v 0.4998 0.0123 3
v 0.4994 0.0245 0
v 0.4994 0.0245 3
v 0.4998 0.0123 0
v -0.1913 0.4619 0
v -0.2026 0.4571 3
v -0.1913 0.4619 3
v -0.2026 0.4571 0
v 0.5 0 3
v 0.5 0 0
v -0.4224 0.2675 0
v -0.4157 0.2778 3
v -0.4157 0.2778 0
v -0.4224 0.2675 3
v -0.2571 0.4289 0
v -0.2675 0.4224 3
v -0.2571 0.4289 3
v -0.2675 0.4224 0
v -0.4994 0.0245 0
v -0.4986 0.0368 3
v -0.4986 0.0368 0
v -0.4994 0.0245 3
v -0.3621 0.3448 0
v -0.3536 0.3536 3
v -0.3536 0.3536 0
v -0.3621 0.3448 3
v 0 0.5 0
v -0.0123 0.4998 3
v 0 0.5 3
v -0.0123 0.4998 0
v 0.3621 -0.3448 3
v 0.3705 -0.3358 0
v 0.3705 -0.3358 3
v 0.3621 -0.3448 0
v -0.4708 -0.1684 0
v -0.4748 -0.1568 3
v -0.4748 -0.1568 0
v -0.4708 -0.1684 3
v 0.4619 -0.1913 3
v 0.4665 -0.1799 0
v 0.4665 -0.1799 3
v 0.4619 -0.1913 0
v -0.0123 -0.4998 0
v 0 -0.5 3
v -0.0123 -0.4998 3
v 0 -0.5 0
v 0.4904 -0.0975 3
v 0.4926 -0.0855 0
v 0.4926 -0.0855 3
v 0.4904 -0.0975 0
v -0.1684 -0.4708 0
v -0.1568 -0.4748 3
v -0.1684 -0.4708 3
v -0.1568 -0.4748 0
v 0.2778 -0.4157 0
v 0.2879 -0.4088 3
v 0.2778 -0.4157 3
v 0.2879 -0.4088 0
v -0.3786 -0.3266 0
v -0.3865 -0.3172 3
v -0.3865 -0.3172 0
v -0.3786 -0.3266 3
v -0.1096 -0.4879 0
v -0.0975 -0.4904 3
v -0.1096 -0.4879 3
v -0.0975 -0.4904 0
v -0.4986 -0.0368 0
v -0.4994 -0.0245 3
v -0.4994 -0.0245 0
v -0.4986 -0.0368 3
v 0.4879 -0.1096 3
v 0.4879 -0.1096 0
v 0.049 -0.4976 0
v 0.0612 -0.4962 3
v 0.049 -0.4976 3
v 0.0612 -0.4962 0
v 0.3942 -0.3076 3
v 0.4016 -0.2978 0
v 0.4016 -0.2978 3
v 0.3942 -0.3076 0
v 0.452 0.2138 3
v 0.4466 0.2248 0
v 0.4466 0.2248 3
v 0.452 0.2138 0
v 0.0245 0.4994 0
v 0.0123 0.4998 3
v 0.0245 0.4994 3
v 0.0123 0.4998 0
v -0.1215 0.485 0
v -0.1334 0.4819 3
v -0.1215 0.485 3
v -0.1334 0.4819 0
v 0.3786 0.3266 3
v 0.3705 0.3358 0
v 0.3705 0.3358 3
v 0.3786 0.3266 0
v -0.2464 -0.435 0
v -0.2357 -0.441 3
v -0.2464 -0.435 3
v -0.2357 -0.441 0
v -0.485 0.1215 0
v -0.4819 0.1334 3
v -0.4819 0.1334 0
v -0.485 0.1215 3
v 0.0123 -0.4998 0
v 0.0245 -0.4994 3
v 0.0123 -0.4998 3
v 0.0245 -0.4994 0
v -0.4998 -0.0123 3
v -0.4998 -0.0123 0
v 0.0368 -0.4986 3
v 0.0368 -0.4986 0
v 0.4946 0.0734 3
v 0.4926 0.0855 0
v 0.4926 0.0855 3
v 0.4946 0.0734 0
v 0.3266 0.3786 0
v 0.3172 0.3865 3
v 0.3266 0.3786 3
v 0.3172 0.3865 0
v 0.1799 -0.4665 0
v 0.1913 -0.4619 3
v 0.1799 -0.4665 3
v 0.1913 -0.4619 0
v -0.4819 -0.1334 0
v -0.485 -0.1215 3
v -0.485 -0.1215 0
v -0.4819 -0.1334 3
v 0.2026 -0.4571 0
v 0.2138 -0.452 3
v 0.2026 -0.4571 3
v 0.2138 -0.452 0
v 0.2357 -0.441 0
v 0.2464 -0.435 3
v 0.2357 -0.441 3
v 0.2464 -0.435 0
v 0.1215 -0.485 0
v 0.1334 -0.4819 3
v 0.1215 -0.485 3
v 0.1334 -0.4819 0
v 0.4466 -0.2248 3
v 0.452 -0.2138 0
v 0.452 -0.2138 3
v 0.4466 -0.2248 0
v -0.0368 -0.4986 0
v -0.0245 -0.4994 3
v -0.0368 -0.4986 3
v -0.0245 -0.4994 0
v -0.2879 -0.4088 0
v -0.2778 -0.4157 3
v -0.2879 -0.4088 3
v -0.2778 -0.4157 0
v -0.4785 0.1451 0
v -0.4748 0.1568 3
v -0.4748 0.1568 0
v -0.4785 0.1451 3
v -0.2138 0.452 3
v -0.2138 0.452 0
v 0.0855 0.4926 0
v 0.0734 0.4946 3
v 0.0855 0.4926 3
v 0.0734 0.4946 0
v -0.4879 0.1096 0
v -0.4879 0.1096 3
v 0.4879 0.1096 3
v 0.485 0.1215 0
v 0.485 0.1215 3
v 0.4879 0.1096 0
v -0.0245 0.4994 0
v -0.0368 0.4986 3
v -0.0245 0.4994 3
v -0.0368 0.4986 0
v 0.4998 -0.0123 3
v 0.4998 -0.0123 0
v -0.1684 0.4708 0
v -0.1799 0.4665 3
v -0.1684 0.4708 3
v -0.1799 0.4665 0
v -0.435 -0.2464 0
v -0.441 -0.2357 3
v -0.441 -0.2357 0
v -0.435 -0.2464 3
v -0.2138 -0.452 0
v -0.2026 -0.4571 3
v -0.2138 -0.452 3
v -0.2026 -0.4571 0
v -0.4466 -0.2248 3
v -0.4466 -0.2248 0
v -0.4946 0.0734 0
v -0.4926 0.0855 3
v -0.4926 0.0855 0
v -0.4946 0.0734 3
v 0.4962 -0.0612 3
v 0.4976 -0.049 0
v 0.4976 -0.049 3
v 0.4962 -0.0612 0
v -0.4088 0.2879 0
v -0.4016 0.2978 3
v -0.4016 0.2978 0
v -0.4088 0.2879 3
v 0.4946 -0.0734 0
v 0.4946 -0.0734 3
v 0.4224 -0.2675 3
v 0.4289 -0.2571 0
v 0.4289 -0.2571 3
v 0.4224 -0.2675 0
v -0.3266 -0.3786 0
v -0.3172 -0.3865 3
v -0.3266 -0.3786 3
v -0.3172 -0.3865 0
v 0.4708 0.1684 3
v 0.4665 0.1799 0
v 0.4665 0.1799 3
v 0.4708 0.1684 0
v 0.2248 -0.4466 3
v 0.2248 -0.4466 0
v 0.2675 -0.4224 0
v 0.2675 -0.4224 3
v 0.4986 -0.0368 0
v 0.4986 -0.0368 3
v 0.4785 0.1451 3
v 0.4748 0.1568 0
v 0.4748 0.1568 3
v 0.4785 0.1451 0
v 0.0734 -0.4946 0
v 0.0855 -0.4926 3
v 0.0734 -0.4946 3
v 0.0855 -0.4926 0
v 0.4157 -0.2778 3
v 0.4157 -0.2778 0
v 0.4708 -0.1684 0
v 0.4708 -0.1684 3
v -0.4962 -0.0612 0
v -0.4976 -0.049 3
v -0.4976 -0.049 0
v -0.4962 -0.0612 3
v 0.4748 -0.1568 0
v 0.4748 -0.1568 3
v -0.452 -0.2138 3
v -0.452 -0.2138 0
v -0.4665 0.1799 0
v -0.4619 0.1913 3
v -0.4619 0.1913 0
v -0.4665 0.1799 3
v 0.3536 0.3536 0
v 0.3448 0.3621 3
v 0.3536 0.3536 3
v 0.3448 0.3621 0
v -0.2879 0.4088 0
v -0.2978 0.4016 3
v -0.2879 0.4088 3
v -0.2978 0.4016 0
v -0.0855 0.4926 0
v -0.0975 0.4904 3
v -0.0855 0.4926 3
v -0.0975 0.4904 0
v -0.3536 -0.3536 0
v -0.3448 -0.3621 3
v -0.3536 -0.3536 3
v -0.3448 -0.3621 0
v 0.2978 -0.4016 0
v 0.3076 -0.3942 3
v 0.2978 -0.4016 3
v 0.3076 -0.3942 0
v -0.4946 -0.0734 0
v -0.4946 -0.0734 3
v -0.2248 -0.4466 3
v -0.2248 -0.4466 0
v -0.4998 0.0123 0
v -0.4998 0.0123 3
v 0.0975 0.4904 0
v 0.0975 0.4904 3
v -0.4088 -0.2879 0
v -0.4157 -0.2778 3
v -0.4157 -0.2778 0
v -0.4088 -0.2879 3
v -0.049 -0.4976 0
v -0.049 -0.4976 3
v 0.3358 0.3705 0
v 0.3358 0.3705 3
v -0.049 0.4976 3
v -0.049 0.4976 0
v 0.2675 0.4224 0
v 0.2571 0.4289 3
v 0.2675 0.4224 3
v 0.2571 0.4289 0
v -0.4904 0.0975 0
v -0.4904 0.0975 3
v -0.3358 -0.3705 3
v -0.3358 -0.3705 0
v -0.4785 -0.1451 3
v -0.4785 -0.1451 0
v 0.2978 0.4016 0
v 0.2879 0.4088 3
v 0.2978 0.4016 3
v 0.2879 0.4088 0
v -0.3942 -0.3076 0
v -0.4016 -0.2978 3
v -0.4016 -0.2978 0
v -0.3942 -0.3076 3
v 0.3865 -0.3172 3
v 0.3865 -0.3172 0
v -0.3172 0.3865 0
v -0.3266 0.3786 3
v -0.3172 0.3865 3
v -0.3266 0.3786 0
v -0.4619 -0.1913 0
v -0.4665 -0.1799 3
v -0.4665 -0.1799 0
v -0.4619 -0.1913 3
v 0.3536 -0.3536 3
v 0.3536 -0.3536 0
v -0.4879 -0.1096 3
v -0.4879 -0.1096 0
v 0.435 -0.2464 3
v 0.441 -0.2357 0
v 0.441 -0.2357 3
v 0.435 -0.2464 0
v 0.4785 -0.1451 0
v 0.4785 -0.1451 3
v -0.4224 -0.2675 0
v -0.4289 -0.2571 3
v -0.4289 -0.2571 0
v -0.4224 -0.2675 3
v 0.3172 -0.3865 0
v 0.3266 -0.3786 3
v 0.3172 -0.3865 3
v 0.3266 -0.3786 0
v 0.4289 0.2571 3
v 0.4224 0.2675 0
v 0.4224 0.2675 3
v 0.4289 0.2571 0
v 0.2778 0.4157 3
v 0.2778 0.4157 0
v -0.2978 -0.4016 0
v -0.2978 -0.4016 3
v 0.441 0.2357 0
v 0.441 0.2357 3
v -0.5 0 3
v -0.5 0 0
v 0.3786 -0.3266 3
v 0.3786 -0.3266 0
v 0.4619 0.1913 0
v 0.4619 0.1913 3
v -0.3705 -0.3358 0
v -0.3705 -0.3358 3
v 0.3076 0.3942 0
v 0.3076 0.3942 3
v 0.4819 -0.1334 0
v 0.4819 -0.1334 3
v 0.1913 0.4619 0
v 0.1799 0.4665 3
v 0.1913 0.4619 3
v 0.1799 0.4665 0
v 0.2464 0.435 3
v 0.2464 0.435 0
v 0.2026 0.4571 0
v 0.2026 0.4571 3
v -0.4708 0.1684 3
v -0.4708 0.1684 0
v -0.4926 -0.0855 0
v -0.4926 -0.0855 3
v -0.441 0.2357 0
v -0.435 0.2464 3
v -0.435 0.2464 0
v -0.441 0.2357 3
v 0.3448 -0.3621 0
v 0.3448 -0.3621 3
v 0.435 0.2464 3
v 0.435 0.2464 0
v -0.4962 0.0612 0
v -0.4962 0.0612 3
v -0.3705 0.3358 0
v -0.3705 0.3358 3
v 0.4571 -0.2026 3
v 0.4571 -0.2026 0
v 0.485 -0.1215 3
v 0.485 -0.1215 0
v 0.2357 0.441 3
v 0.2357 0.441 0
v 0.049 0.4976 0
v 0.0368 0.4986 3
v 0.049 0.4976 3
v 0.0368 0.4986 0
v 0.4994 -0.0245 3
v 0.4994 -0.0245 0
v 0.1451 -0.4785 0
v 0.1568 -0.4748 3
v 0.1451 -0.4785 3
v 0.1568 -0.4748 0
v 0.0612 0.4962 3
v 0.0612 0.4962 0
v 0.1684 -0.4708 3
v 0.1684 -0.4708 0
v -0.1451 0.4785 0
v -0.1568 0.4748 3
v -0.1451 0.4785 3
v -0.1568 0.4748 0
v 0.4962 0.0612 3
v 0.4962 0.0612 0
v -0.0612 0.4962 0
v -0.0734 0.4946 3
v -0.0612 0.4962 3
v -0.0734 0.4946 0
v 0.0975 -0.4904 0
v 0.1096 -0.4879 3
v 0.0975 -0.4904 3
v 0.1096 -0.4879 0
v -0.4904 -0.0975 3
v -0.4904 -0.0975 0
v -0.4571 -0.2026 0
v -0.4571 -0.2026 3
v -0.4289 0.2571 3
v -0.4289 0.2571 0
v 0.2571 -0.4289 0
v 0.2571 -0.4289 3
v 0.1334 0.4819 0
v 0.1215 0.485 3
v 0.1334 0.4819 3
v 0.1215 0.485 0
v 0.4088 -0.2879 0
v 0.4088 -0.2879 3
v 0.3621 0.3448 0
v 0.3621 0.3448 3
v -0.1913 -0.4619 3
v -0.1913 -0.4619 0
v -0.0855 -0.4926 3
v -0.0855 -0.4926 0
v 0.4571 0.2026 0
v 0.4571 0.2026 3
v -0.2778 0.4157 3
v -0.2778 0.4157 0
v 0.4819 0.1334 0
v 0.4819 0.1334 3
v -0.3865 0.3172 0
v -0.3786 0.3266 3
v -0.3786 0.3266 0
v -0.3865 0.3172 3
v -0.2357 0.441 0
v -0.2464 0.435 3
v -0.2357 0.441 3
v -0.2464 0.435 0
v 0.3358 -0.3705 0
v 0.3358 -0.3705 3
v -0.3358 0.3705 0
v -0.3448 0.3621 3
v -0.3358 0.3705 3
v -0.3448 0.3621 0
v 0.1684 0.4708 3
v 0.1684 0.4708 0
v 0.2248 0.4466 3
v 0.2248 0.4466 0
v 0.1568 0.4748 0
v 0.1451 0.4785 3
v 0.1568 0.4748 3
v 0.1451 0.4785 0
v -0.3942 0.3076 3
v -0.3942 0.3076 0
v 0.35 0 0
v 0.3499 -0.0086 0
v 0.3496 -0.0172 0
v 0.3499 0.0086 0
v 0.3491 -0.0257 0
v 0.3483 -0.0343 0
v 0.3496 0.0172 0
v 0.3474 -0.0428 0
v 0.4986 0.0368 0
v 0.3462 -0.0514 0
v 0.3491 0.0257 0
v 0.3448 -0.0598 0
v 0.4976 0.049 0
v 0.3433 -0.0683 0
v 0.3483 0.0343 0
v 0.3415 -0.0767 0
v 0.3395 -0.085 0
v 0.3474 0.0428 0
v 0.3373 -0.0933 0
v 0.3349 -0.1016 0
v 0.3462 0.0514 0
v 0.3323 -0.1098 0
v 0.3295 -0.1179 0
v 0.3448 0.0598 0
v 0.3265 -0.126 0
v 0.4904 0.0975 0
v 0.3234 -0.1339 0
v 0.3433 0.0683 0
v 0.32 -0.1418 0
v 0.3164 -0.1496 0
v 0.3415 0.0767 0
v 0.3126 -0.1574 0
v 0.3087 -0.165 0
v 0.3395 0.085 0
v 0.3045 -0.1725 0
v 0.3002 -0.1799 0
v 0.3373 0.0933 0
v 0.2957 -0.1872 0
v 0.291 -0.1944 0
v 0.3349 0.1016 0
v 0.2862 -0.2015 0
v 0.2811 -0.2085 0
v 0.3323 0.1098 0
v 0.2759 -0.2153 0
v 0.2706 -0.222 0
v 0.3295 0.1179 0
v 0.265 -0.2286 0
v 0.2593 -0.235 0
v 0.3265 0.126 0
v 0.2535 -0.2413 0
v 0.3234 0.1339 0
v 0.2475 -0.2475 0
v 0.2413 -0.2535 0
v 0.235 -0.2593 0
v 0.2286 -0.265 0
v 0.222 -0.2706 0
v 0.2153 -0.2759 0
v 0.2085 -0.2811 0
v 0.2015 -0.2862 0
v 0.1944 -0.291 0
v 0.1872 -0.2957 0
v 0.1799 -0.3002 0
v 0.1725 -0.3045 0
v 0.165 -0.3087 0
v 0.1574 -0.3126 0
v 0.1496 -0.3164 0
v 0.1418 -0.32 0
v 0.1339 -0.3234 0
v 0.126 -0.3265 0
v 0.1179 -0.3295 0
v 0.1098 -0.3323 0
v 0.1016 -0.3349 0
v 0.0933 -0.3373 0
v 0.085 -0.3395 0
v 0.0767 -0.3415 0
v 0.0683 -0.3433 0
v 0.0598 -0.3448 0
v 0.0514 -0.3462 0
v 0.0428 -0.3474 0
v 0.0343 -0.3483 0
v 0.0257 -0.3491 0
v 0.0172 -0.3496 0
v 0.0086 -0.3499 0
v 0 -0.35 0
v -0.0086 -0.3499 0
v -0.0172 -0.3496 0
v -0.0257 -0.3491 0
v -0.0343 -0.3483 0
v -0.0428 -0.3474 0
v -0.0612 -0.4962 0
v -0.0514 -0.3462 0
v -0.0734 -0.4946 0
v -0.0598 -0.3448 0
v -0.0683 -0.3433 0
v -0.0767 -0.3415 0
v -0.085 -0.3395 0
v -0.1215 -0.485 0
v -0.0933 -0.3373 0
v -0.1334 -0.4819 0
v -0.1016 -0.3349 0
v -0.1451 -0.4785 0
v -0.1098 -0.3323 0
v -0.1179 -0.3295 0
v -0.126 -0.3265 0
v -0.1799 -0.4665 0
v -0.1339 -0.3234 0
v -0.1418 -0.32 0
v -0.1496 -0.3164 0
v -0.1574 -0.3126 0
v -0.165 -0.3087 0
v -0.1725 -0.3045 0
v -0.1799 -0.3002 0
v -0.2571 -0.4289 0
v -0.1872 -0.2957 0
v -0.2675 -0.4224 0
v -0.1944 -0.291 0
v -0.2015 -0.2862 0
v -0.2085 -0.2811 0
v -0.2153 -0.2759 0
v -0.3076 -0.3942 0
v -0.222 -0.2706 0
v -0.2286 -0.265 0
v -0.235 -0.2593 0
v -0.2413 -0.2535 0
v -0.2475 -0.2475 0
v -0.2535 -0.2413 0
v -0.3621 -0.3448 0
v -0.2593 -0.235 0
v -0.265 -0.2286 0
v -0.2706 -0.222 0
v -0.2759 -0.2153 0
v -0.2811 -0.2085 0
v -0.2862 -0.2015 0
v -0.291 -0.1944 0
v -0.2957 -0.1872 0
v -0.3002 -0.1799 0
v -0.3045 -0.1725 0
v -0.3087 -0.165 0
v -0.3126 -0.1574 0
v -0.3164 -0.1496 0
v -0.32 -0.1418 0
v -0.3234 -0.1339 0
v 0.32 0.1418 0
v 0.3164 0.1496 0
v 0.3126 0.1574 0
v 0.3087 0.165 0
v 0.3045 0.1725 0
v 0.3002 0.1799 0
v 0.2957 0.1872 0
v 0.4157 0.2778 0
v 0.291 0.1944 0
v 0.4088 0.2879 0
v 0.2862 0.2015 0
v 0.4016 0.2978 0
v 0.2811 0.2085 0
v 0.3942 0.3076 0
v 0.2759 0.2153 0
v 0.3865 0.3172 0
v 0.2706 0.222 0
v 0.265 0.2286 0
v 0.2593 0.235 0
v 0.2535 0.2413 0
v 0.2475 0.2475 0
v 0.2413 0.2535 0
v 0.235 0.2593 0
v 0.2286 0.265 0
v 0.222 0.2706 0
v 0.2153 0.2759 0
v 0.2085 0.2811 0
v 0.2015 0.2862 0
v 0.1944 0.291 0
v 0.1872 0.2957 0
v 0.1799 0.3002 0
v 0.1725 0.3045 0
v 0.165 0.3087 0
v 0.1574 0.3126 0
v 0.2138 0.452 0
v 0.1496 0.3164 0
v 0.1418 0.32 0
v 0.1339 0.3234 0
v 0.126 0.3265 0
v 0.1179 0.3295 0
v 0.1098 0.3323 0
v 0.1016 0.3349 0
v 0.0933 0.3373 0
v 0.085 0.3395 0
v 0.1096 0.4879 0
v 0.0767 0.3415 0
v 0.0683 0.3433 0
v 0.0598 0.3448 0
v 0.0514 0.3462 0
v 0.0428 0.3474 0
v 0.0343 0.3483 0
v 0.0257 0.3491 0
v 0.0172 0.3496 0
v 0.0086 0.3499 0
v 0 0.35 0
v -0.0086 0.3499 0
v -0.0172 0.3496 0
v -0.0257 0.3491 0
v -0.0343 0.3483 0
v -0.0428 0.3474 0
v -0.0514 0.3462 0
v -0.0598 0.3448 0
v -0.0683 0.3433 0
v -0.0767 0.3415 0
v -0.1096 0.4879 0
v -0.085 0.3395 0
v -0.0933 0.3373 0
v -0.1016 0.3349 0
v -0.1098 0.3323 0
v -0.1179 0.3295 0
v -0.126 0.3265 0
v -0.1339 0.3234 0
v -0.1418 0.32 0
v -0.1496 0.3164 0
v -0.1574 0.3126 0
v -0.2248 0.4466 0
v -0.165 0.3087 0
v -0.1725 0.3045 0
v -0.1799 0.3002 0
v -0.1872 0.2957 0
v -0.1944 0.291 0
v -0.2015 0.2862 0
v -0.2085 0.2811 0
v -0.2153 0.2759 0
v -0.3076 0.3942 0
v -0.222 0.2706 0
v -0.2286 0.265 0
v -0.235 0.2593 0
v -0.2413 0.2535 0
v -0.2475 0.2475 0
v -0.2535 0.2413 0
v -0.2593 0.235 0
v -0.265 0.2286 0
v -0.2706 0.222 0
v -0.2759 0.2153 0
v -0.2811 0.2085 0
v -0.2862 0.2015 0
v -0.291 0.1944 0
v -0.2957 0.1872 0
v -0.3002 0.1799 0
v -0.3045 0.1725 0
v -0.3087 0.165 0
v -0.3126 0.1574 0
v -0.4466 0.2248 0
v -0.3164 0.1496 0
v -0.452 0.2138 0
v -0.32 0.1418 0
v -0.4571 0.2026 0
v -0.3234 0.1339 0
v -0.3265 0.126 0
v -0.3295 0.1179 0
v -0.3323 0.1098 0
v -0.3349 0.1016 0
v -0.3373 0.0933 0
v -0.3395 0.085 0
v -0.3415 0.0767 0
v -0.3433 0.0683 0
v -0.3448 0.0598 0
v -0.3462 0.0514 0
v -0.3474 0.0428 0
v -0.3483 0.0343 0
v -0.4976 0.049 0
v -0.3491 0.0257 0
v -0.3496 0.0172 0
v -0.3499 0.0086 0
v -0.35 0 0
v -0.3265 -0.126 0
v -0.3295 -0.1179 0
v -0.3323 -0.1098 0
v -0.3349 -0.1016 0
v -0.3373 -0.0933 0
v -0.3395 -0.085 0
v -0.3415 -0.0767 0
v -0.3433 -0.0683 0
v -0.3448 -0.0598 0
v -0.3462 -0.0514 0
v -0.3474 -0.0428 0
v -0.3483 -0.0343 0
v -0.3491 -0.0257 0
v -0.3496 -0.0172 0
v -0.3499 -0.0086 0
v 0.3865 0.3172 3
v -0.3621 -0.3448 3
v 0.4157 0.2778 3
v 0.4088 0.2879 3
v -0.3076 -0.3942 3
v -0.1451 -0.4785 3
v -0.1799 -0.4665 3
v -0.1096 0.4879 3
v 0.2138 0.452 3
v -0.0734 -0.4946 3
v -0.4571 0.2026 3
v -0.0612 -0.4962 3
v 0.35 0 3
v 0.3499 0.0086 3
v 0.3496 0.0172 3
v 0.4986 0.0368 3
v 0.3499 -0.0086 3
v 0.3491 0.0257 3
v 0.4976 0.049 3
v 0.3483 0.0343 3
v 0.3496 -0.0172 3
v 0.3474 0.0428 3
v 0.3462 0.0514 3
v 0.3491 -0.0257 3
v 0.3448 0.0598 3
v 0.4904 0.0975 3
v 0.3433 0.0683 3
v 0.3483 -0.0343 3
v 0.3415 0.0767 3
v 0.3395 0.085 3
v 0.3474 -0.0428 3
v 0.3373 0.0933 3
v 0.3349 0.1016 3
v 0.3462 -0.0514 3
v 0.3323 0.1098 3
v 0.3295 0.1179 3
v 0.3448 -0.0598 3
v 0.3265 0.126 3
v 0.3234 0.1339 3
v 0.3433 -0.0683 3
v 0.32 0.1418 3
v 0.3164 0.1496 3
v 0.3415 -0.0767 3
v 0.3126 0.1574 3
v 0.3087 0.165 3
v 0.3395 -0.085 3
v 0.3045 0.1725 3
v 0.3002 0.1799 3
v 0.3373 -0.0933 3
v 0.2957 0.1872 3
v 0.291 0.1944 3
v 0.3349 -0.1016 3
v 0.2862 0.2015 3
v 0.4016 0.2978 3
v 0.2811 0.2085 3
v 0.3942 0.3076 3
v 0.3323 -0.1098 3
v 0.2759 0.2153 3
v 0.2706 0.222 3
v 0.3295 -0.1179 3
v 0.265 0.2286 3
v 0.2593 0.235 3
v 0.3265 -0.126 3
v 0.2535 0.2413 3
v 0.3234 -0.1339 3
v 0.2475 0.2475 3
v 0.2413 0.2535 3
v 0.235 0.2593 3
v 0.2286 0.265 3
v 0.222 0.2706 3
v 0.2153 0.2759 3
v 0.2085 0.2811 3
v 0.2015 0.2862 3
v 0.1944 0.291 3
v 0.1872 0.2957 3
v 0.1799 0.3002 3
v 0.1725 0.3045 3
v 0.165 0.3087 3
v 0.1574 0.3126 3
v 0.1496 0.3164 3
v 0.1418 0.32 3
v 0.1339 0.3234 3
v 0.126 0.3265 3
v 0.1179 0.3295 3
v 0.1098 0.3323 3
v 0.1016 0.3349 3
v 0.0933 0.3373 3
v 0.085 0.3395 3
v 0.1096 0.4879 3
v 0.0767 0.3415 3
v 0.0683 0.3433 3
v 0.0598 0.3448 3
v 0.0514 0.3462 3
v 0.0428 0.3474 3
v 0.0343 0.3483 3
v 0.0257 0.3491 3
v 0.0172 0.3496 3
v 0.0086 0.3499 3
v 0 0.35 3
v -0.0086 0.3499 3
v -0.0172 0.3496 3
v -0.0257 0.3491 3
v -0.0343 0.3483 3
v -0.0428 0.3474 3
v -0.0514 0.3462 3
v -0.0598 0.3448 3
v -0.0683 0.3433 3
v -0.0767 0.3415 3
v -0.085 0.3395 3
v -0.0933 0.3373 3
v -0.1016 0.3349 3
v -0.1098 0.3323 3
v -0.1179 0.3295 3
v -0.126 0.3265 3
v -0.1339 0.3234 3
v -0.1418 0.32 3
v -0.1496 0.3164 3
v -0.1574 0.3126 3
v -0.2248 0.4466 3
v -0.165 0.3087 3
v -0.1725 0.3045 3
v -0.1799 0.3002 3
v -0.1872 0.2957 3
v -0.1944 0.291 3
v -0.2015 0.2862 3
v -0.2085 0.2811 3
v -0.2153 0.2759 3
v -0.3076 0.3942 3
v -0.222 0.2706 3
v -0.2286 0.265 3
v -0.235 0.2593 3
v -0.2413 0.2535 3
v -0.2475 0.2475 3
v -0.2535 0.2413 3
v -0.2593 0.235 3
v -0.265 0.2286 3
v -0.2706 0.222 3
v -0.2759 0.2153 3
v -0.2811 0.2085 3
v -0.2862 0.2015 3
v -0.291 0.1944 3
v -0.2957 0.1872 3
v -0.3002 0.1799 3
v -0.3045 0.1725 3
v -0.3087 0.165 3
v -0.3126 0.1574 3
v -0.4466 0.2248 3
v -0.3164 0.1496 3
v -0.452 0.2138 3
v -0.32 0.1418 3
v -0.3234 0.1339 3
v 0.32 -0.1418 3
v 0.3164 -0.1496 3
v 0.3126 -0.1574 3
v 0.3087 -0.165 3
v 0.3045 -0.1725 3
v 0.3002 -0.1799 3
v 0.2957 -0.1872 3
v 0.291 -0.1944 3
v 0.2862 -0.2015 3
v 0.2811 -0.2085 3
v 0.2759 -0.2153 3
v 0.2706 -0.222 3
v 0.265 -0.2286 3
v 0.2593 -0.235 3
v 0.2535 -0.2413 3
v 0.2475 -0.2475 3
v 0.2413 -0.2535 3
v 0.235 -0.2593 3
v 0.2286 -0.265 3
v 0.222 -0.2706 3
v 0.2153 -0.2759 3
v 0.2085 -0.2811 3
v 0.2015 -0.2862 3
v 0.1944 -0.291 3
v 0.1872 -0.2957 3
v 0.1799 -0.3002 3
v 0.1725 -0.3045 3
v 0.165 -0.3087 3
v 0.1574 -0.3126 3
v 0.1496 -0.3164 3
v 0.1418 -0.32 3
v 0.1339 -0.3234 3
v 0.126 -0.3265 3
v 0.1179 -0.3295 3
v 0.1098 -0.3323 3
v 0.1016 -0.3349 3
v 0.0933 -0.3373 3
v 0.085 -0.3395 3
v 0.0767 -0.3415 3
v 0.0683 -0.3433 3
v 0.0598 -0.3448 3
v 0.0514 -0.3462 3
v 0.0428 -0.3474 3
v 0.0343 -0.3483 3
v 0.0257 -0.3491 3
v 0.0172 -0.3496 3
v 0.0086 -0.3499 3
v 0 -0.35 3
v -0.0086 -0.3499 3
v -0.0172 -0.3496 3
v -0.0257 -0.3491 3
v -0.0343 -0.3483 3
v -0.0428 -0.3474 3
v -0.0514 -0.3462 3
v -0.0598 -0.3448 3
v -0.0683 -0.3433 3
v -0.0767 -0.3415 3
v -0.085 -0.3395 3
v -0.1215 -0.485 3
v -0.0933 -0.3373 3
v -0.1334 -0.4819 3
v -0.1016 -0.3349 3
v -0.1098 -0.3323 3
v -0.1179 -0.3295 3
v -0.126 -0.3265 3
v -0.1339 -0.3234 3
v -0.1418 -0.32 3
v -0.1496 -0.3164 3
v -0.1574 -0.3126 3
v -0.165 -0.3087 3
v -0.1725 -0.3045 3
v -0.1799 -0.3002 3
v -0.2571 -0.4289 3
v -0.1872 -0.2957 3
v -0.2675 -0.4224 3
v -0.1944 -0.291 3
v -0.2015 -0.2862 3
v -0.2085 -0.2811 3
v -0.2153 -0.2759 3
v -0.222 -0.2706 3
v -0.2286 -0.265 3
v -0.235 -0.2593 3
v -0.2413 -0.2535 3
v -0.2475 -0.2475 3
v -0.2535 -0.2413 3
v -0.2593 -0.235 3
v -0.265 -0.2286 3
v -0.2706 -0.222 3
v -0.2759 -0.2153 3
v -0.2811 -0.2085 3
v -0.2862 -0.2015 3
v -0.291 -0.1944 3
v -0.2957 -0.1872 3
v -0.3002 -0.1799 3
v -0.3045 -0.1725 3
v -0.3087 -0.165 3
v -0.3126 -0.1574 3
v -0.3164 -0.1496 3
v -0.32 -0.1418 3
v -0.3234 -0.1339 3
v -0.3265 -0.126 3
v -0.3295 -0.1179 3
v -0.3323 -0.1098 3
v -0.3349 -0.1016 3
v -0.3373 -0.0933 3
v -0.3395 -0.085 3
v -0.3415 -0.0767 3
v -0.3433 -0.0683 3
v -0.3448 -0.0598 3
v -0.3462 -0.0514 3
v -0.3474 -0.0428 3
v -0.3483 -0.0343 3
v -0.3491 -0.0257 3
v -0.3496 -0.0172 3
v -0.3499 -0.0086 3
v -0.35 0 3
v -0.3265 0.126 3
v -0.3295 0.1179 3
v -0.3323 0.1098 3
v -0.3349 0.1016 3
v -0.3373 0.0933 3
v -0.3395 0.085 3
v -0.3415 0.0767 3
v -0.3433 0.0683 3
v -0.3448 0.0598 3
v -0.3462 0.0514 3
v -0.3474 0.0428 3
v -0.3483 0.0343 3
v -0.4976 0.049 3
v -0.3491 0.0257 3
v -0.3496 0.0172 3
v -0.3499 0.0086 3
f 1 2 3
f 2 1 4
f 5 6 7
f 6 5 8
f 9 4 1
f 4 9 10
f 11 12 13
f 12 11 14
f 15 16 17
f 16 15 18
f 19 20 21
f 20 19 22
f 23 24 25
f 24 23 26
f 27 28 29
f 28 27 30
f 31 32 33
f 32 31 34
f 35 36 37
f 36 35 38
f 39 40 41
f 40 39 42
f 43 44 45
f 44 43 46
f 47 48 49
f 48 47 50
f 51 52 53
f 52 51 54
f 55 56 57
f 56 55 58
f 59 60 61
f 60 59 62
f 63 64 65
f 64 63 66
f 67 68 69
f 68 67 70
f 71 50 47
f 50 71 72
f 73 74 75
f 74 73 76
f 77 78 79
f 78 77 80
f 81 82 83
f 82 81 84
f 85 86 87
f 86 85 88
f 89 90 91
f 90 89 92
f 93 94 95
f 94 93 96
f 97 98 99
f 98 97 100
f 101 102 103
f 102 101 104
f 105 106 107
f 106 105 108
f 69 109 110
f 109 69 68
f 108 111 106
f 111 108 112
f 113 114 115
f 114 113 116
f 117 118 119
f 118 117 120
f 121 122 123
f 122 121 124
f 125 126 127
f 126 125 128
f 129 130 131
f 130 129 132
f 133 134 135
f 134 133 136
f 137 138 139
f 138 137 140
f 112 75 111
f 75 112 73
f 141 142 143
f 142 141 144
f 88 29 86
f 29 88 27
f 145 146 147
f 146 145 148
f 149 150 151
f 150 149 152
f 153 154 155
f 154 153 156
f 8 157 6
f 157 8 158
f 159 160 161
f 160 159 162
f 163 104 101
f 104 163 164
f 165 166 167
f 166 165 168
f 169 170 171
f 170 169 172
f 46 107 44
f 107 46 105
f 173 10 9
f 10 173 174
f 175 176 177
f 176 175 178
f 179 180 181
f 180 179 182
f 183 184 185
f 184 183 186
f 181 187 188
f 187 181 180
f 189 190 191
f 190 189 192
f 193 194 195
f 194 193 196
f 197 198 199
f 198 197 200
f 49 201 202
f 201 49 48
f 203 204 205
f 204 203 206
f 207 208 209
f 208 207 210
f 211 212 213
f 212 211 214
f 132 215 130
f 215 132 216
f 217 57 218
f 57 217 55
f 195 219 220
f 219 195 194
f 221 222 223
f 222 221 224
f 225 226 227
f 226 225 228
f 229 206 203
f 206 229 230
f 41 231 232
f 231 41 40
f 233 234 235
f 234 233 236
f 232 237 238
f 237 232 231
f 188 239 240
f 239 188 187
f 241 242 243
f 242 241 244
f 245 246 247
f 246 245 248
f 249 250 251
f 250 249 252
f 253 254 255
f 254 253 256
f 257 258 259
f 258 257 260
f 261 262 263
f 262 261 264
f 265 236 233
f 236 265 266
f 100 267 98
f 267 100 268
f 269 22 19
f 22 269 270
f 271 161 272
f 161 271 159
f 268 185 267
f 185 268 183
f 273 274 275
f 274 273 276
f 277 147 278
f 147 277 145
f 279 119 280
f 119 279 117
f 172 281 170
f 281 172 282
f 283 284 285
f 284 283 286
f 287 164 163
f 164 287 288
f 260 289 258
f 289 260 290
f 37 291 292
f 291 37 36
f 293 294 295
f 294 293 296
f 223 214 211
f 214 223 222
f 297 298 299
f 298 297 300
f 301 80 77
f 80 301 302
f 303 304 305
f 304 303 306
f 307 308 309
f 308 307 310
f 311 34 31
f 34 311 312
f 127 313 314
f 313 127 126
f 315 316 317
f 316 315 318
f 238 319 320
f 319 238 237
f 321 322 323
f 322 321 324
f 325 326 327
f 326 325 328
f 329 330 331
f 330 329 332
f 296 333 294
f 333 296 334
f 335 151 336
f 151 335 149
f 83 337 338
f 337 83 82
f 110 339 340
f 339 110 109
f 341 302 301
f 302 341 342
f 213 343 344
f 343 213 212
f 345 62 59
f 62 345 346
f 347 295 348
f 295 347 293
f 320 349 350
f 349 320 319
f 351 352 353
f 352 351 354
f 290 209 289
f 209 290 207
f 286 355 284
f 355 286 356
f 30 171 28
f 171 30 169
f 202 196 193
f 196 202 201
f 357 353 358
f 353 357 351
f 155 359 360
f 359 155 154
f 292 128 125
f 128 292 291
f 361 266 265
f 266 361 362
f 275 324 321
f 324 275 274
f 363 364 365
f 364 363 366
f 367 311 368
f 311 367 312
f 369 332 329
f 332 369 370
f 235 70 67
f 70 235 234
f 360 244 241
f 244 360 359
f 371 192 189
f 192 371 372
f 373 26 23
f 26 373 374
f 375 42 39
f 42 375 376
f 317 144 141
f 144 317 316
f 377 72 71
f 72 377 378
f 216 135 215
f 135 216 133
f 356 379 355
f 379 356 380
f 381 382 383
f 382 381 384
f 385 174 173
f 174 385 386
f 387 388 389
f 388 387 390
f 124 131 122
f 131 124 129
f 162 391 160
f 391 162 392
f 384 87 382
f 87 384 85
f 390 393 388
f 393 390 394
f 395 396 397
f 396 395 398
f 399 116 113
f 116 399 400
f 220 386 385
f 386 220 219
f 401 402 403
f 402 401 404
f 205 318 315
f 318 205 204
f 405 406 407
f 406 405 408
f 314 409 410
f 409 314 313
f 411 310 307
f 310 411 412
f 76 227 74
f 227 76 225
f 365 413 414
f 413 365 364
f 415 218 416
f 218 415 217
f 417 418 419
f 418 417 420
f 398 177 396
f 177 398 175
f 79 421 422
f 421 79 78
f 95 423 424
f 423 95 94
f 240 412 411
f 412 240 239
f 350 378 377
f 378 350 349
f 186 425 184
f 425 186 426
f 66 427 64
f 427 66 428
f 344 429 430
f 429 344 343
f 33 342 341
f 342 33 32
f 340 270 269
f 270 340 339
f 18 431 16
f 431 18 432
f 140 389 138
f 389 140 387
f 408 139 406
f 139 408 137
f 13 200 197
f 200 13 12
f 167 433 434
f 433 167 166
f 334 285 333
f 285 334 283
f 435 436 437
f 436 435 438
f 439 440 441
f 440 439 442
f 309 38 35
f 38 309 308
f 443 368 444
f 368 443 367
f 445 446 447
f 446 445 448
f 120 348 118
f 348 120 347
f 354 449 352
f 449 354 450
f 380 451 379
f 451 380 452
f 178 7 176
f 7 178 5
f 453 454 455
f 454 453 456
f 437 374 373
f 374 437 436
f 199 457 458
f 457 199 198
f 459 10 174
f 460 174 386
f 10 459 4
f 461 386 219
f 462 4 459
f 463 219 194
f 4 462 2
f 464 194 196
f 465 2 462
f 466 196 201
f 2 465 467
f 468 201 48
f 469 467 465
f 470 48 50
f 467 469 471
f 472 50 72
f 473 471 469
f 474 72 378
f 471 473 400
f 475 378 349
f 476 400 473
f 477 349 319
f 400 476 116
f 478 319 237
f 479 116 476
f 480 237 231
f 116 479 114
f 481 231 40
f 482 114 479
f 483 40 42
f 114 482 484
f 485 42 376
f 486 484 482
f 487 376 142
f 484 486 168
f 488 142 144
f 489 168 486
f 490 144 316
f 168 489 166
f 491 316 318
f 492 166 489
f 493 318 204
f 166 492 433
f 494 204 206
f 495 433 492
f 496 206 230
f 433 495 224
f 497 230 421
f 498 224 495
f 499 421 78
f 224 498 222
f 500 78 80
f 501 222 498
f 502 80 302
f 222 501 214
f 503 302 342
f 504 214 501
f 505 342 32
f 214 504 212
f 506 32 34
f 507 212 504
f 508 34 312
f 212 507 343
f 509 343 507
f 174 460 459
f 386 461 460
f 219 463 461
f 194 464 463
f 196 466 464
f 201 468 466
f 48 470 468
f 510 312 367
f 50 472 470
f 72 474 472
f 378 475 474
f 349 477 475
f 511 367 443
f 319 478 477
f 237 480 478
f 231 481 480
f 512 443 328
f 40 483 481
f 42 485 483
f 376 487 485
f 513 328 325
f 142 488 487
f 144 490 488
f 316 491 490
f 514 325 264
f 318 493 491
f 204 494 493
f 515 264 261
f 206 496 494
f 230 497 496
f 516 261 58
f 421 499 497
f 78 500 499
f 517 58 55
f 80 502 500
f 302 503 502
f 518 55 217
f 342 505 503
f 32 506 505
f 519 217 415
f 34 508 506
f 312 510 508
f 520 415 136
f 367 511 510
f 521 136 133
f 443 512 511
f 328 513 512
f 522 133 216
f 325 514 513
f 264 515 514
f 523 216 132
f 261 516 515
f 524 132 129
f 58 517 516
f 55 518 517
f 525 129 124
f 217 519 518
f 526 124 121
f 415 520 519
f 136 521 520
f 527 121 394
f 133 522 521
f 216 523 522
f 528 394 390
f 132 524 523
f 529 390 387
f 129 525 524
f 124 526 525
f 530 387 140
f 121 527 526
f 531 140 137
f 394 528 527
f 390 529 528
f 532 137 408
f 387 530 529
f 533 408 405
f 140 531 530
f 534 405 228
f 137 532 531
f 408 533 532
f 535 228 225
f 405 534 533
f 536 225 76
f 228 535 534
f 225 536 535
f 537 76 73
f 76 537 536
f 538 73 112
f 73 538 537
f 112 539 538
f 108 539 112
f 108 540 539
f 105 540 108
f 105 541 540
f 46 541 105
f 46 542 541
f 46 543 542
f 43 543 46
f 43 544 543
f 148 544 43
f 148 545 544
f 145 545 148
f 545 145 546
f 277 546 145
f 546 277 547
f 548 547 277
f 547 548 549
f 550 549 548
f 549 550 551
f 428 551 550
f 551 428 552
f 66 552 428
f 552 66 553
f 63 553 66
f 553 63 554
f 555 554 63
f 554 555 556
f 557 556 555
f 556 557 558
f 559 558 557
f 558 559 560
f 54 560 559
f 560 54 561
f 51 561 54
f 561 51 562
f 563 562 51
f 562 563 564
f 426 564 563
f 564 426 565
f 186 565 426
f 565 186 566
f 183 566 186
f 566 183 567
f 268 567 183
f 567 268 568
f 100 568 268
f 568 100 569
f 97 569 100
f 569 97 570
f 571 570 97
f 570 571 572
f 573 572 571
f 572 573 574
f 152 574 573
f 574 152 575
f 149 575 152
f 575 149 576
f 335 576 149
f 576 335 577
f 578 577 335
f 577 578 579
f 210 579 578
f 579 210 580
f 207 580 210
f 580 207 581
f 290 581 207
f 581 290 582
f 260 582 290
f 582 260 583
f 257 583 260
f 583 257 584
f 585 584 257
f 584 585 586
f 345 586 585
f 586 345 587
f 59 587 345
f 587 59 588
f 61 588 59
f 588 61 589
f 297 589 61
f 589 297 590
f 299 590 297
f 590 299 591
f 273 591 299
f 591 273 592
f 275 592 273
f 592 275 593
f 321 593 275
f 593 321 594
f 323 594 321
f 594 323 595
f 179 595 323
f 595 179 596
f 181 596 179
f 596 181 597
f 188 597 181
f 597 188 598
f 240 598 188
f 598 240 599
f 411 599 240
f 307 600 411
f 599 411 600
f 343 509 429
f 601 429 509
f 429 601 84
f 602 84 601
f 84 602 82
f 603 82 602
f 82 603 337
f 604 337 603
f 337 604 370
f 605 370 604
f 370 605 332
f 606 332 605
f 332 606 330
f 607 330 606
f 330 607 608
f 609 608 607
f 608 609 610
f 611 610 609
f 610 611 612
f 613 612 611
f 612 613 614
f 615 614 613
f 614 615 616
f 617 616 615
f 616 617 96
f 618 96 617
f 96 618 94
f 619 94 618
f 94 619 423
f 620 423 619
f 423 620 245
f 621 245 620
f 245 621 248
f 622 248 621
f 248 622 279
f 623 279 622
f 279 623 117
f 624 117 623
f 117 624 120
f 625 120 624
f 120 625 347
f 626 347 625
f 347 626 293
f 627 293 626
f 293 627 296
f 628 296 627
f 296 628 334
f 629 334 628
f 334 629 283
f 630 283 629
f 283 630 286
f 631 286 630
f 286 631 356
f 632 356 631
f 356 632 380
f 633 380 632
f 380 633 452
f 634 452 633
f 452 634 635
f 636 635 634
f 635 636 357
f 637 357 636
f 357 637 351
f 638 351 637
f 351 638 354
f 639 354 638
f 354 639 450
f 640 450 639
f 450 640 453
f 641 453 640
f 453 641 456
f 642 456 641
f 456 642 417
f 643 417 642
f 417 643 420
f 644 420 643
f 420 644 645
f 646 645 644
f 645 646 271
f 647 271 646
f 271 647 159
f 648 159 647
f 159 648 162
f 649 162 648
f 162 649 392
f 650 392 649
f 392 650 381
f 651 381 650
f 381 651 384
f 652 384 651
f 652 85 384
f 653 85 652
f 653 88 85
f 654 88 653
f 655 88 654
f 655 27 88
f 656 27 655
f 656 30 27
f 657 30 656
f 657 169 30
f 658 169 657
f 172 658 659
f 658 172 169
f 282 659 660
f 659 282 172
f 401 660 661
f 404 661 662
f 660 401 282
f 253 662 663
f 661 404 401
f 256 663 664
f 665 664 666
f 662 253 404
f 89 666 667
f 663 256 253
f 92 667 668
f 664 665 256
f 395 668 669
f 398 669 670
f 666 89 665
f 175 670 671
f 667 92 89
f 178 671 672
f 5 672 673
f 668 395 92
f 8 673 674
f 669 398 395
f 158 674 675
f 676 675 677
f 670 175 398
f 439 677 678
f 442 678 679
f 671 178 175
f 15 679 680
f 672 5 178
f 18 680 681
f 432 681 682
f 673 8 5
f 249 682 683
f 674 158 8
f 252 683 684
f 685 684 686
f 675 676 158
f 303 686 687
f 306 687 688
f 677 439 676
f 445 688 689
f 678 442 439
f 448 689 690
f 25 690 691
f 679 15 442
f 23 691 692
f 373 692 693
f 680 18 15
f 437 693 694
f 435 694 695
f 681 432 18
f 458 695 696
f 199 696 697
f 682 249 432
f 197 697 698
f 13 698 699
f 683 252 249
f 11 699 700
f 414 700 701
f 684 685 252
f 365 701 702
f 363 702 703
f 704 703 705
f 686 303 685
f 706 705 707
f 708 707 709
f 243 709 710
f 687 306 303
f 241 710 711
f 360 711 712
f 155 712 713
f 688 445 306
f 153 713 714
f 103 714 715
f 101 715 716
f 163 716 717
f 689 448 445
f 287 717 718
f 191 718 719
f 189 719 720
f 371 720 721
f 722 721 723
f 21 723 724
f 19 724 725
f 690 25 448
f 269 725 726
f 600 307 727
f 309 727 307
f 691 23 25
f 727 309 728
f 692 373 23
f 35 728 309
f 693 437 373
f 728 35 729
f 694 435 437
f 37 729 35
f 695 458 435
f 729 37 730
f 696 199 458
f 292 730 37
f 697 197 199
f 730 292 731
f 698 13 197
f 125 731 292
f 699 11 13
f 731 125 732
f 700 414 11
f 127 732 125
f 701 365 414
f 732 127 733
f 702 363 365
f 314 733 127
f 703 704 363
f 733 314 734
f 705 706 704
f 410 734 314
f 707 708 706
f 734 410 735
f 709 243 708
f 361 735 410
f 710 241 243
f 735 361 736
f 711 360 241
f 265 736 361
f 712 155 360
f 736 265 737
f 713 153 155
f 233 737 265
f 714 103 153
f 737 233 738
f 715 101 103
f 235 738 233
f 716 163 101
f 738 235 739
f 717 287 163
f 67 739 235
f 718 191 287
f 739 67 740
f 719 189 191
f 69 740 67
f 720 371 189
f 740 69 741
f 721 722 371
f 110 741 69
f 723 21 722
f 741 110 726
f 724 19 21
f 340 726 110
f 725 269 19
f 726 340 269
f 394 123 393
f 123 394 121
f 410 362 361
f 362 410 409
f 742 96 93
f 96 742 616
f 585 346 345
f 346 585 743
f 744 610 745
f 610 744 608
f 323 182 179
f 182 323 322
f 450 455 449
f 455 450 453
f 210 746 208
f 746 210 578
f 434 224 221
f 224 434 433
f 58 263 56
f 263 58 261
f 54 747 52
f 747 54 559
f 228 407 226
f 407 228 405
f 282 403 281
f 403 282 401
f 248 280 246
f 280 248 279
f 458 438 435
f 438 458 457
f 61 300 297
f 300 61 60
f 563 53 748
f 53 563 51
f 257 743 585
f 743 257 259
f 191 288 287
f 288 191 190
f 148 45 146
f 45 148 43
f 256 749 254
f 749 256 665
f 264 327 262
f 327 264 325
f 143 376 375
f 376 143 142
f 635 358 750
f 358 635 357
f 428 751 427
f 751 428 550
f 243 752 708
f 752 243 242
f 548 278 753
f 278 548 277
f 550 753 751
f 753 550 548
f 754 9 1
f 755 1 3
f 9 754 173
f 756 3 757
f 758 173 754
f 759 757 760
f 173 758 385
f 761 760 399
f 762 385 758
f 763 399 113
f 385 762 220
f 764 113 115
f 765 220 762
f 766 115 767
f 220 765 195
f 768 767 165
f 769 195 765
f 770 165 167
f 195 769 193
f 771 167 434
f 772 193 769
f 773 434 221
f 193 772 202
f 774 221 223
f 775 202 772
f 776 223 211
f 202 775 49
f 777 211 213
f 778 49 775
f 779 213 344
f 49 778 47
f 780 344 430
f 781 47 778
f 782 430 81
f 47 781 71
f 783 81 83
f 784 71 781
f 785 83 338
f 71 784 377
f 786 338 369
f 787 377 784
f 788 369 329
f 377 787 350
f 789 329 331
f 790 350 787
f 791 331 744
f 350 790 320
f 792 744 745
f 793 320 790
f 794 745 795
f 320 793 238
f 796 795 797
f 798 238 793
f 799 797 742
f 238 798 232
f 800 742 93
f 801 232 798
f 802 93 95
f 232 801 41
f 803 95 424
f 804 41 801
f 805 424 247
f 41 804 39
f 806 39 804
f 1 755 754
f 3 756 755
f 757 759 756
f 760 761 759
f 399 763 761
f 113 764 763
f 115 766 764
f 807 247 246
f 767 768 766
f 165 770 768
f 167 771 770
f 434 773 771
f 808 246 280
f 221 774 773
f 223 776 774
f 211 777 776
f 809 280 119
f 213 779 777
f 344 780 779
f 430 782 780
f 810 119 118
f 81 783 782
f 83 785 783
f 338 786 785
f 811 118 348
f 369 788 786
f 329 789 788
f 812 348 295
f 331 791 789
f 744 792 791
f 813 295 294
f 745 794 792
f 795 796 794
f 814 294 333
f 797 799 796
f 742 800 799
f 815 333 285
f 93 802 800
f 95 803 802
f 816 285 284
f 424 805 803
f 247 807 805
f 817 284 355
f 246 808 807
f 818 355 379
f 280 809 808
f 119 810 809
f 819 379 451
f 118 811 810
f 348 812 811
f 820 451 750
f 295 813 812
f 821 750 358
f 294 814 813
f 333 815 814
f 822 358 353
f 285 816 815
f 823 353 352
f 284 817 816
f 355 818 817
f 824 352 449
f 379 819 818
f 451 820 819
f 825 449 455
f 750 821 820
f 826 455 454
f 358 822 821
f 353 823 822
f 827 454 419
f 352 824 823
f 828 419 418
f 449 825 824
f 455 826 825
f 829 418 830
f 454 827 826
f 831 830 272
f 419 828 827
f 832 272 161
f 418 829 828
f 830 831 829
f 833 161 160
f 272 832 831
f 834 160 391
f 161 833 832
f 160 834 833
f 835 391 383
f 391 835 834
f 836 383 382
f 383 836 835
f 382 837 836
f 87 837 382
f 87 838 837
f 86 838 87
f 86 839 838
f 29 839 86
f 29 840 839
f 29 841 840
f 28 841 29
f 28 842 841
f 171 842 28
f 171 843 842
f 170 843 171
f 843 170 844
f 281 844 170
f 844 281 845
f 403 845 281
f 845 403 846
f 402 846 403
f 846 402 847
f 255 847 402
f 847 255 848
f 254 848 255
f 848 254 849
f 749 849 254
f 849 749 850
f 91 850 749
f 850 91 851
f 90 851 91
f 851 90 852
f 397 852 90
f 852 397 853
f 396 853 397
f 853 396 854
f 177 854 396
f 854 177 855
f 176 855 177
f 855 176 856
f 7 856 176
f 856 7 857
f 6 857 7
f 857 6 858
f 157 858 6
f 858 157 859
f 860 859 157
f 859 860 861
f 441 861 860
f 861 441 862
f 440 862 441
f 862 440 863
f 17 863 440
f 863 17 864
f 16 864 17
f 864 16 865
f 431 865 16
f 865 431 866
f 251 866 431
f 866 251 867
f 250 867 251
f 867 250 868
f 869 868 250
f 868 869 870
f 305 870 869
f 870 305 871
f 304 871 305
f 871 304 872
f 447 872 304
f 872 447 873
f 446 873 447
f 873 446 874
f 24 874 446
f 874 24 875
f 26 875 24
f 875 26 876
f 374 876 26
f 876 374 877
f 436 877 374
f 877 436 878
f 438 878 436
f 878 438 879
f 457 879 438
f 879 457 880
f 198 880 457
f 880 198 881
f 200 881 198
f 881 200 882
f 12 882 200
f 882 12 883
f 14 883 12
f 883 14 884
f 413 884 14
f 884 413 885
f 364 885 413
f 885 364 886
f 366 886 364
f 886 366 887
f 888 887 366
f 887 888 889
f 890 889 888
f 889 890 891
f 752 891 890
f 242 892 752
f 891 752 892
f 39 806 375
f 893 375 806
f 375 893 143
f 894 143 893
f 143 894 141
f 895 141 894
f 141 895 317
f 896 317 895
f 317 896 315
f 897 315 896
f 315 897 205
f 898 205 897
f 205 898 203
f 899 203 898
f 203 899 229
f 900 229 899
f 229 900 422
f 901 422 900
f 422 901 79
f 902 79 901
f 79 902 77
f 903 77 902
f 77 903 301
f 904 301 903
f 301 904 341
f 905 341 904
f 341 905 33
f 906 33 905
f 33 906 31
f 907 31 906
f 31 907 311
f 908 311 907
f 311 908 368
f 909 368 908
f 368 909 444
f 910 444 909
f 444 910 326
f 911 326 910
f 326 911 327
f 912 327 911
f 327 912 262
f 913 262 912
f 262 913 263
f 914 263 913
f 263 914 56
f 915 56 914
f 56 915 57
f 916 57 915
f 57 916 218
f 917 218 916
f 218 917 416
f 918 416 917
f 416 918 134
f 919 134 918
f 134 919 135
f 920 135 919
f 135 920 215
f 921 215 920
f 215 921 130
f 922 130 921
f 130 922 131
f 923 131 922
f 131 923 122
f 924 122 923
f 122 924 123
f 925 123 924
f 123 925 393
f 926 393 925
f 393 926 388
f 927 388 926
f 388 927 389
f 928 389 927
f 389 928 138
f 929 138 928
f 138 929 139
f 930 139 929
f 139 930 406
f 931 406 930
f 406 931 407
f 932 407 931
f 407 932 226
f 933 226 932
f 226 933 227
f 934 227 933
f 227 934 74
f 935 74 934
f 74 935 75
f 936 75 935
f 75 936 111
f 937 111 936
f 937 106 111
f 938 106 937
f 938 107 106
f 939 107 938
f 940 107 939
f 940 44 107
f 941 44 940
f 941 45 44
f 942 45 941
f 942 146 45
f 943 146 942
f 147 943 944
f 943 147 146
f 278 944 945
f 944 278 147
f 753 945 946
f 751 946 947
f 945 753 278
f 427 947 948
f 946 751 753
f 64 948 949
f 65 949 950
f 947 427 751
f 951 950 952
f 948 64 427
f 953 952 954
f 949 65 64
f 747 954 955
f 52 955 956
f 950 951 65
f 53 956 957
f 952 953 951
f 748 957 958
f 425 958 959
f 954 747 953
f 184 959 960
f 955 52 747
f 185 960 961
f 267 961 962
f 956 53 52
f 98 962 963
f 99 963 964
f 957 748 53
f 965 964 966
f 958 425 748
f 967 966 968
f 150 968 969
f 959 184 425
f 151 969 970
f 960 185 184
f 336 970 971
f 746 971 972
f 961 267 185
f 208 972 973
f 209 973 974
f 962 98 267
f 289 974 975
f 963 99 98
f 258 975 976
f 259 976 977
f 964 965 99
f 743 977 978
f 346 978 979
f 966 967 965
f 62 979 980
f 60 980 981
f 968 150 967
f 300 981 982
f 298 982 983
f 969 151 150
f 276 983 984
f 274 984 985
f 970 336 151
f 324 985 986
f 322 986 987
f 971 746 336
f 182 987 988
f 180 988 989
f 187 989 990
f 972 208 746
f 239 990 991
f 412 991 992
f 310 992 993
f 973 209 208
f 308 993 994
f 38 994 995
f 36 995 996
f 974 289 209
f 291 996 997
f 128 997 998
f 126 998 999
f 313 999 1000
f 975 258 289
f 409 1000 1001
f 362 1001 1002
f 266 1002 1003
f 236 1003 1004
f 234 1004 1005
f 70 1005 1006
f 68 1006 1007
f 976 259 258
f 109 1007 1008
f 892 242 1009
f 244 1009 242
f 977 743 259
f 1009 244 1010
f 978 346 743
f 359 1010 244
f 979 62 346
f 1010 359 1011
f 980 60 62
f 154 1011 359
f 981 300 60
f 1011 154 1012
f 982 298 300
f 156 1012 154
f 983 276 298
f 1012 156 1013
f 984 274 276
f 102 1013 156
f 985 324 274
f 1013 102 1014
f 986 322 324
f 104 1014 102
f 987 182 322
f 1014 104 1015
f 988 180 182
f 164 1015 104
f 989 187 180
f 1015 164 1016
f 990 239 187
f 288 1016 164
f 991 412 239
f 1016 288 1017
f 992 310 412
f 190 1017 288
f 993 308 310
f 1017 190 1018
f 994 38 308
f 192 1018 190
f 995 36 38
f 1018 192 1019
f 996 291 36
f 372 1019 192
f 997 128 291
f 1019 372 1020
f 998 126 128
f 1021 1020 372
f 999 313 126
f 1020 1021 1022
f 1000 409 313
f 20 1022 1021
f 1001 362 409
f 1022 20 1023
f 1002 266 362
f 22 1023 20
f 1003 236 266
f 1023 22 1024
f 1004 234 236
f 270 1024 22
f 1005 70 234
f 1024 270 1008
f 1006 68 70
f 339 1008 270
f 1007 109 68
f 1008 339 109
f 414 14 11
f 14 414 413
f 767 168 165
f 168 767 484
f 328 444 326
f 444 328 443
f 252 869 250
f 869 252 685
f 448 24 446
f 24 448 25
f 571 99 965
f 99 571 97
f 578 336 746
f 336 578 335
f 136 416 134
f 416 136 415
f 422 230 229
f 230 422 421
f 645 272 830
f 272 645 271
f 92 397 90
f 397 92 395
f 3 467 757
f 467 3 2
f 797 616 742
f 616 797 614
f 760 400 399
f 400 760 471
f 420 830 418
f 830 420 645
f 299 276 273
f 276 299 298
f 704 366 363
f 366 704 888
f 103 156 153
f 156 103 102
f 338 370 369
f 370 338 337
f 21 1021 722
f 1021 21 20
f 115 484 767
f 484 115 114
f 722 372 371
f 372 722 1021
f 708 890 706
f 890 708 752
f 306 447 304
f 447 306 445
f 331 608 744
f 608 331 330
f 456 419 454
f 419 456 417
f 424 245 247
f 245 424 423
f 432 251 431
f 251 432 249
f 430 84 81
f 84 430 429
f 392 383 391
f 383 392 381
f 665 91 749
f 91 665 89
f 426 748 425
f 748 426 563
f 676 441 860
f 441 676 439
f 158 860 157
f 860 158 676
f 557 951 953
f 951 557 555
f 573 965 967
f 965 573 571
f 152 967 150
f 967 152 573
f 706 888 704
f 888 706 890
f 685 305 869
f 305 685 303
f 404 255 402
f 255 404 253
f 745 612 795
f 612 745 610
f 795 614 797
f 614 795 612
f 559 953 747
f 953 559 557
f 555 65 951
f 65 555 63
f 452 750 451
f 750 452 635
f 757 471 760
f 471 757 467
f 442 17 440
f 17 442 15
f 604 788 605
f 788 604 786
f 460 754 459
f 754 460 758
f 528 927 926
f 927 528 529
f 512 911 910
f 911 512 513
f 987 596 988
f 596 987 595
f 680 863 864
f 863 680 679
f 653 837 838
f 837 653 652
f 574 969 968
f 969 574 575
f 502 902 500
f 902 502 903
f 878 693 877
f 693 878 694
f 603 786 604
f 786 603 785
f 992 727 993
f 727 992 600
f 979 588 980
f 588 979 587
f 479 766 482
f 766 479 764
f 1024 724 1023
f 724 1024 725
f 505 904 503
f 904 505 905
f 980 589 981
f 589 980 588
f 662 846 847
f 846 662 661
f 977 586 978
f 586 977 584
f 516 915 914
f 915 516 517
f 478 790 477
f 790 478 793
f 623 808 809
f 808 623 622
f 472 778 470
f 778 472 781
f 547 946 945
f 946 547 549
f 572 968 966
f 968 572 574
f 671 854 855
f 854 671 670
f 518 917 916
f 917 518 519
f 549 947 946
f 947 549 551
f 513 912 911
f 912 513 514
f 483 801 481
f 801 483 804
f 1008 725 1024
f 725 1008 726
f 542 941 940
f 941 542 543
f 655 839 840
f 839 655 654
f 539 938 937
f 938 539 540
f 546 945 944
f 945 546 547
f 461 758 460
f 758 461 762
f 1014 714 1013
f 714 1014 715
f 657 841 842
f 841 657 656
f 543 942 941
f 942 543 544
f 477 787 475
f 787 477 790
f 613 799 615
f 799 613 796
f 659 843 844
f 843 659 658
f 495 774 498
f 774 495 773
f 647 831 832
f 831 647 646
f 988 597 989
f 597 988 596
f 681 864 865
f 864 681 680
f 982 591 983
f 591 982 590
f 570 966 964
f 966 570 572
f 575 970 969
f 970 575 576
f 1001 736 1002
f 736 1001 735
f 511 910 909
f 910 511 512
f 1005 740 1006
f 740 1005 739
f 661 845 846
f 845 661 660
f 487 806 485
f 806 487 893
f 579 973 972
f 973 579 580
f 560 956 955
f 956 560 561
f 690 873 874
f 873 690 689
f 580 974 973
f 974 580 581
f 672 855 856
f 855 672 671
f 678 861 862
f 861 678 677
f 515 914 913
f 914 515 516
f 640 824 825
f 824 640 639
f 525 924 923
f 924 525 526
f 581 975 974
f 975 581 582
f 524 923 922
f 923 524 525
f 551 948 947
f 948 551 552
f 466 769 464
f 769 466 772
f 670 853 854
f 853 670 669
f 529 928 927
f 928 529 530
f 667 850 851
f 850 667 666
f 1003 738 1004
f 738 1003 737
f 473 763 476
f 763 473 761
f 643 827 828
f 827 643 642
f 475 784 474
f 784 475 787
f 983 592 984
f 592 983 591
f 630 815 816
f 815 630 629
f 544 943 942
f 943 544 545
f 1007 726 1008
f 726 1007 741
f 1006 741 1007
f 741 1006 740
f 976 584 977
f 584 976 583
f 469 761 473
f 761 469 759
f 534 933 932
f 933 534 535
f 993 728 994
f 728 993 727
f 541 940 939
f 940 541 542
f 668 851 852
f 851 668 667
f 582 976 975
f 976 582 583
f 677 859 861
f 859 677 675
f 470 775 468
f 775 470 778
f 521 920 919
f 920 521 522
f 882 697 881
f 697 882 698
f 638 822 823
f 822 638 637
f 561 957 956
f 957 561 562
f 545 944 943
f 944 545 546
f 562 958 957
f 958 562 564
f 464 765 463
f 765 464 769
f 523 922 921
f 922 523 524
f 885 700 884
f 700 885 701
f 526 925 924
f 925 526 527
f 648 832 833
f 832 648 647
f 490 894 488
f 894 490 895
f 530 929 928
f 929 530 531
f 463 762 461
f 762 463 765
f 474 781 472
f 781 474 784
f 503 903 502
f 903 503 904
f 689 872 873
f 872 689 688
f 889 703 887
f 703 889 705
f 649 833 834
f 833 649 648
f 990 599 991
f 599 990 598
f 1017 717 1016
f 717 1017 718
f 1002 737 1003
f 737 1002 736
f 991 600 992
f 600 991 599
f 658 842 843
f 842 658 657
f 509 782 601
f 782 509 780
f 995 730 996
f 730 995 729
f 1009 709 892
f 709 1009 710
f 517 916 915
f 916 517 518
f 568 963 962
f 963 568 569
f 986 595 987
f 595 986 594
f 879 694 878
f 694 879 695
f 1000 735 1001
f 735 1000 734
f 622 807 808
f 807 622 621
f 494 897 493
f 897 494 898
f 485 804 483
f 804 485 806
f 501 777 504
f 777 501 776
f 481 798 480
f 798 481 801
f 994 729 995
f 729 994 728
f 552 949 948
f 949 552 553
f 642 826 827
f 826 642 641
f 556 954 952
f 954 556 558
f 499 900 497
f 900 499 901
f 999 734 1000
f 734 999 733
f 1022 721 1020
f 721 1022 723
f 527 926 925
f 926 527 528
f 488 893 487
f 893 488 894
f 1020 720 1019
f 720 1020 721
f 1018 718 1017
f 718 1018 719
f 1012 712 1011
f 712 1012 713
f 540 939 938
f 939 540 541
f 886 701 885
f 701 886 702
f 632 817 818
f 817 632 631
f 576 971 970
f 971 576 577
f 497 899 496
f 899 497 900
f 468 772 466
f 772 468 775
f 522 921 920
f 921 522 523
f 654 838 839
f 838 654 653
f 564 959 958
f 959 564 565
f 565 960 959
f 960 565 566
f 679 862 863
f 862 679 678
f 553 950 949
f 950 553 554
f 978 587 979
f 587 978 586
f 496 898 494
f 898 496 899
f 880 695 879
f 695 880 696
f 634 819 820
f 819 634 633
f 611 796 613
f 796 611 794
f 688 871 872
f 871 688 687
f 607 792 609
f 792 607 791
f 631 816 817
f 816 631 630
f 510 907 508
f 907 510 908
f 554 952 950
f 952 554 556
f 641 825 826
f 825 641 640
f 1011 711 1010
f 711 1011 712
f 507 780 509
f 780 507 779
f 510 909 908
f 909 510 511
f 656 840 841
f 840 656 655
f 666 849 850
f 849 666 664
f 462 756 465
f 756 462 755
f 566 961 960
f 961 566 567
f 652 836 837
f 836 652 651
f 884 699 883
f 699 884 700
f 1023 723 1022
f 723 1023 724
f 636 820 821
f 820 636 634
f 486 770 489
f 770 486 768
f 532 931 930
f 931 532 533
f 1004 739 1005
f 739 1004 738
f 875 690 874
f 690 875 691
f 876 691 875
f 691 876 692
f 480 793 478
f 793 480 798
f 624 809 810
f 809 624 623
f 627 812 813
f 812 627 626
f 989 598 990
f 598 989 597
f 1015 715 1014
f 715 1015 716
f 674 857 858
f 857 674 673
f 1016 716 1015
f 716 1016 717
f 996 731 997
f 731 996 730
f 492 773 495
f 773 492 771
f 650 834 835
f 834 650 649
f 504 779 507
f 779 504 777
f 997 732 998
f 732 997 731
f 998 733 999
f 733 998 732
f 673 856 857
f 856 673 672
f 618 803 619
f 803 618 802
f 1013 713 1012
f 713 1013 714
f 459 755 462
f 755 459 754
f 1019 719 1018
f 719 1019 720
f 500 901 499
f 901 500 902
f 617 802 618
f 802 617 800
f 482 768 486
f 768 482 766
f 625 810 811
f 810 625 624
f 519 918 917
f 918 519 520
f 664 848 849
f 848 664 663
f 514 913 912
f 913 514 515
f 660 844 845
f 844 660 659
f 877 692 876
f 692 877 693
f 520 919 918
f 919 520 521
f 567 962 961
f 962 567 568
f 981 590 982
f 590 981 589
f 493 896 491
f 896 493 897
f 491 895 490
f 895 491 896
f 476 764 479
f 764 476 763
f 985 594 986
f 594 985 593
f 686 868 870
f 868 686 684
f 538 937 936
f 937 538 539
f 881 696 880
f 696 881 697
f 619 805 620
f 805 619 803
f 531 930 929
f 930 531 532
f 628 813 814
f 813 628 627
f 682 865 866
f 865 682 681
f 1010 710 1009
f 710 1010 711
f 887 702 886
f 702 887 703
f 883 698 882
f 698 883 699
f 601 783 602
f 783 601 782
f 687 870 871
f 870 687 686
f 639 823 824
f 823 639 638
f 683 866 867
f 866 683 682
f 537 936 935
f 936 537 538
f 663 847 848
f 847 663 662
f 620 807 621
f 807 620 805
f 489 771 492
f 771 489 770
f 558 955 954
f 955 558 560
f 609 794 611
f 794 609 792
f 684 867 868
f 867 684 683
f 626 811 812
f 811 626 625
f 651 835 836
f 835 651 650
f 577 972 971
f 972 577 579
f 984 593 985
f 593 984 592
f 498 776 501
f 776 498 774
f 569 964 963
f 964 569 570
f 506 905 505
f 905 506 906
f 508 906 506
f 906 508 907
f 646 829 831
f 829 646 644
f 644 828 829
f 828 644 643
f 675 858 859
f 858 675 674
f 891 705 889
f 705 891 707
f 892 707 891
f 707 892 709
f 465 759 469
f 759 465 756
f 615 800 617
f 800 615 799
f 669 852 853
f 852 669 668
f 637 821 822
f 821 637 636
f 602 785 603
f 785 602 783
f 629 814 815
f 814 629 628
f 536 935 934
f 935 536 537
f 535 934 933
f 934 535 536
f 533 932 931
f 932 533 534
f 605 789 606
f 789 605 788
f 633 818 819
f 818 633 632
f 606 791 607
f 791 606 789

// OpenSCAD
// Tube for Stacks of Shapes
// by Slashee the Cow
$fn = 256;

color("DarkKhaki")
difference(){
    linear_extrude(3)
        circle(d=1);
    linear_extrude(4)
        circle(d=0.7);
}
